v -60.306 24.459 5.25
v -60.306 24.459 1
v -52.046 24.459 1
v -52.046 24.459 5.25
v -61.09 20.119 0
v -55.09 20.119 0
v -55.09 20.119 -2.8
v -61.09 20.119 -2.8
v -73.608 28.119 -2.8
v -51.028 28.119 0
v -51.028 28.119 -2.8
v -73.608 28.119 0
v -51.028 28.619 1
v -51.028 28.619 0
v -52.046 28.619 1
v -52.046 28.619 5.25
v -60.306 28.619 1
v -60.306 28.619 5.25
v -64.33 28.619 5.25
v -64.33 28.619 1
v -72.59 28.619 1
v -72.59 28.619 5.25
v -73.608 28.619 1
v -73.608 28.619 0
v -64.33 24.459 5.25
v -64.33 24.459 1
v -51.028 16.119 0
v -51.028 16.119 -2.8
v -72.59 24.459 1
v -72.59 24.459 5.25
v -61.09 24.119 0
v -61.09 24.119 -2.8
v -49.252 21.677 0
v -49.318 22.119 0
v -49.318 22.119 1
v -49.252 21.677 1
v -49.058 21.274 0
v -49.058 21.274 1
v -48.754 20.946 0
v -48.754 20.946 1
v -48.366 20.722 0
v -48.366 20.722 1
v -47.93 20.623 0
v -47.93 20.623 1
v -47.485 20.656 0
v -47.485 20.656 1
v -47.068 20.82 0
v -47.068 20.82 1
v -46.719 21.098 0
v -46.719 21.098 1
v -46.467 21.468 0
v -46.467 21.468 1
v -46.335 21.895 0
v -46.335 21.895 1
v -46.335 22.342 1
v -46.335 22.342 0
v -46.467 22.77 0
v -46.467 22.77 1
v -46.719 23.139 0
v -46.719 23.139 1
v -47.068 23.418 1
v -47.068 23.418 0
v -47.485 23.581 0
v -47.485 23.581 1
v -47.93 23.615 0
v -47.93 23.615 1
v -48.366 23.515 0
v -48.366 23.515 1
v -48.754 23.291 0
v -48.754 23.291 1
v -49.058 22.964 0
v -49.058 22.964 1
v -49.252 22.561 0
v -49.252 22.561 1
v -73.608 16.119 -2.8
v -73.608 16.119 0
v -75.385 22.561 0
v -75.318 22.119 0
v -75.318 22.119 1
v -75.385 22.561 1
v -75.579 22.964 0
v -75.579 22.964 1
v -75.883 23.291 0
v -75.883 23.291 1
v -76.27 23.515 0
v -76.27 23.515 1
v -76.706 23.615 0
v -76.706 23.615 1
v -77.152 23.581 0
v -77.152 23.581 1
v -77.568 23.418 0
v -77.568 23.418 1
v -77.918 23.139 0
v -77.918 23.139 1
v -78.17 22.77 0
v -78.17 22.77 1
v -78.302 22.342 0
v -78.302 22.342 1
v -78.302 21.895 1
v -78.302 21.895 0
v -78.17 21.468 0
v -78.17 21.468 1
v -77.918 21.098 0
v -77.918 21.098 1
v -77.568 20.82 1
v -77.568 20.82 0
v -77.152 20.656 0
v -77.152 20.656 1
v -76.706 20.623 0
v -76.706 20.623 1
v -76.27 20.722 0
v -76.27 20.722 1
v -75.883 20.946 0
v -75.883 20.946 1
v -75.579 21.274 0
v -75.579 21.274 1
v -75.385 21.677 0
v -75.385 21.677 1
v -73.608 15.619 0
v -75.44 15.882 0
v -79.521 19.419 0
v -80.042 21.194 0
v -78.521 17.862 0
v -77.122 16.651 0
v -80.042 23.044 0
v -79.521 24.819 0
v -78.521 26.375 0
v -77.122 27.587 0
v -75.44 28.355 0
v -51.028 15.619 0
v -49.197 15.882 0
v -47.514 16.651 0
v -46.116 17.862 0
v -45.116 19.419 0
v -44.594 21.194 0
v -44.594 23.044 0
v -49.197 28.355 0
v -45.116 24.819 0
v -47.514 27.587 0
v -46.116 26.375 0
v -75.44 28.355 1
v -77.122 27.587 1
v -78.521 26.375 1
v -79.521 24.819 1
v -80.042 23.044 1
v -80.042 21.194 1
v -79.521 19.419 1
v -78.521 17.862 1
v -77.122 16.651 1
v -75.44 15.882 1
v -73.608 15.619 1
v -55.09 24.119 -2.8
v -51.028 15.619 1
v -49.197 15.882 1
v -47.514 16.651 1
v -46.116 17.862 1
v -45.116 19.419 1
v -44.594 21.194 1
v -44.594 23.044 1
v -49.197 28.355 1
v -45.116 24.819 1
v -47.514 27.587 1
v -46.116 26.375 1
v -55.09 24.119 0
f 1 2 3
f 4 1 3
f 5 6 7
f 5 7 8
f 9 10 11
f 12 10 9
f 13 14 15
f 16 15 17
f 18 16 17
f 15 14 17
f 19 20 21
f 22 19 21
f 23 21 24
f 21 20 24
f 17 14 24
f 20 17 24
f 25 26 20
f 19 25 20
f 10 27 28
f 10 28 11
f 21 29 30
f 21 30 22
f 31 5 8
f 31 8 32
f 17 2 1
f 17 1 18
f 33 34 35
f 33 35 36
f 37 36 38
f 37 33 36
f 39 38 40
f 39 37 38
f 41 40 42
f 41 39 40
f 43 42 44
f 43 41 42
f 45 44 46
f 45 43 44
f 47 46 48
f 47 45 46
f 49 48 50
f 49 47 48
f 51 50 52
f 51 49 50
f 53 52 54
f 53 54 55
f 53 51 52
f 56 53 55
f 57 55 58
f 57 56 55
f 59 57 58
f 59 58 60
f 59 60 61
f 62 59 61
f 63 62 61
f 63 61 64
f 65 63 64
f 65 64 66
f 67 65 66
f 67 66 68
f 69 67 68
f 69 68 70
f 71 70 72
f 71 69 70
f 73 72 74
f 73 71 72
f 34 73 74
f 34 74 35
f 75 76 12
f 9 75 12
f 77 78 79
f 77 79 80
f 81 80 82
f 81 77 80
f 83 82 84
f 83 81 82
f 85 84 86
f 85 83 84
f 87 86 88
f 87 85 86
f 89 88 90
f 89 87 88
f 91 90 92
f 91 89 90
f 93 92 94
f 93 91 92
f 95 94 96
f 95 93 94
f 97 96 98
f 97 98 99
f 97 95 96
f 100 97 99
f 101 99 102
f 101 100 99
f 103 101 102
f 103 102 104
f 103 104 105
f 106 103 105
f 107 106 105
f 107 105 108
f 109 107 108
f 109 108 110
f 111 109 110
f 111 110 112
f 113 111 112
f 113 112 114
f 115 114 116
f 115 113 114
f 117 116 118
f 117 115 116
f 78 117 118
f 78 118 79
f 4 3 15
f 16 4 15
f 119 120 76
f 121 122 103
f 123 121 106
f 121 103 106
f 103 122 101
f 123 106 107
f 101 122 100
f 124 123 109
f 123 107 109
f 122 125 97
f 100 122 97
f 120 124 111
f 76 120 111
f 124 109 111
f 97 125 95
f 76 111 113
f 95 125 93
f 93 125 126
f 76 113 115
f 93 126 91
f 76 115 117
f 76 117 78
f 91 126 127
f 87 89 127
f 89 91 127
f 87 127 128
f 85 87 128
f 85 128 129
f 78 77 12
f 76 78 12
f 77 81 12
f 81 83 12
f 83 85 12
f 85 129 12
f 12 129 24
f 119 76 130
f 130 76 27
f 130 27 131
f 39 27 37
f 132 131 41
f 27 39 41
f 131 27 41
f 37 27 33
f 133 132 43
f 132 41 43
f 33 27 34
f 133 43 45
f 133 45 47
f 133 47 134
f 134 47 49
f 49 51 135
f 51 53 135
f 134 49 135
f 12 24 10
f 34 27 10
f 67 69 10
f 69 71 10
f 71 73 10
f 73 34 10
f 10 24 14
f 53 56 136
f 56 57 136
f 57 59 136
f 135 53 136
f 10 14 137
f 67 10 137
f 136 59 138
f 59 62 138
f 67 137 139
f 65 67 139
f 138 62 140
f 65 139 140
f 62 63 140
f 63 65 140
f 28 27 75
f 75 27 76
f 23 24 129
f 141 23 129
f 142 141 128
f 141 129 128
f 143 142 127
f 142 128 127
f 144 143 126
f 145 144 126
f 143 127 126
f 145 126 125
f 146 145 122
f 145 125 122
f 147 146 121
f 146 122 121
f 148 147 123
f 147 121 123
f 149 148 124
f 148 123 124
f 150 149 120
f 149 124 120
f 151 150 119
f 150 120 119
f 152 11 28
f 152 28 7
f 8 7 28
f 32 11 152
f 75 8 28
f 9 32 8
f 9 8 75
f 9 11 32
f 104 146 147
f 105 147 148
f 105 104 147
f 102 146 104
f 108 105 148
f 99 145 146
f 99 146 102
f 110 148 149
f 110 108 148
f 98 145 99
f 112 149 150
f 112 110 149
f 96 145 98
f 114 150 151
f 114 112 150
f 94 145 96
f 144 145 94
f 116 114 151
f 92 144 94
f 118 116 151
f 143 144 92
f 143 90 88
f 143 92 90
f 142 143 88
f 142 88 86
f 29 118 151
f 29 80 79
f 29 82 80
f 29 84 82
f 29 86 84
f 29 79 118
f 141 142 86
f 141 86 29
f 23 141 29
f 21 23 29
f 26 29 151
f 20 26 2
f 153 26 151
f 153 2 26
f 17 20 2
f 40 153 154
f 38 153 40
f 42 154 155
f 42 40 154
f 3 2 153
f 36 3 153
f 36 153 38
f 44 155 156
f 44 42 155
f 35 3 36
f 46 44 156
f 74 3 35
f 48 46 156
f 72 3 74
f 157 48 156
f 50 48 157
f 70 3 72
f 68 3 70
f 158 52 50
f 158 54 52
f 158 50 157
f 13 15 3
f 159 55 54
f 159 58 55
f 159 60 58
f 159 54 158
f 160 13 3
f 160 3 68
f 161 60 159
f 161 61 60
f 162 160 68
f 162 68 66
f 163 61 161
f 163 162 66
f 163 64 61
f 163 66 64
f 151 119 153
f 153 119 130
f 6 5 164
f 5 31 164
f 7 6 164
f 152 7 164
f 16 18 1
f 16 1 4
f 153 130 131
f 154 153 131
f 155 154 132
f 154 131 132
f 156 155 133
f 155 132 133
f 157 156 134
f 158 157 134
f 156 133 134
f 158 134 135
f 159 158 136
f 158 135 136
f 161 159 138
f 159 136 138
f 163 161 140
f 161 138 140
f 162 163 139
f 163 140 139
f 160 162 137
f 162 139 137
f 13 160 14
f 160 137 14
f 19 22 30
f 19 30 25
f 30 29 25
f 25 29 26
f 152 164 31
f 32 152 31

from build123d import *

# Parameters (mm, degrees)
SKETCH1_R           = 1.5
BOSS_EXTRUDE1_DEPTH = 1
SKETCH3_W           = 22.58
SKETCH3_H           = 12
SKETCH3_W_2         = 6
SKETCH3_H_2         = 4
BOSS_EXTRUDE2_DEPTH = 2.8
SKETCH4_W           = 8.26
SKETCH4_H           = 4.16
BOSS_EXTRUDE3_DEPTH = 4.25


with BuildPart() as part:
    # Sketch1 → Boss-Extrude1 (new body)
    with BuildSketch(Plane.XY):
        with BuildLine():
            Line((-73.608329156, 15.618710575), (-51.028329156, 15.618710575))
            ThreePointArc((-51.028329156, 15.618710575), (-44.528329156, 22.118710575), (-51.028329156, 28.618710575))
            Line((-51.028329156, 28.618710575), (-73.608329156, 28.618710575))
            ThreePointArc((-73.608329156, 28.618710575), (-80.108329156, 22.118710575), (-73.608329156, 15.618710575))
        make_face()
        with Locations((-76.818329156, 22.118710575)):
            Circle(SKETCH1_R, mode=Mode.SUBTRACT)
        with Locations(Location((-47.818329156, 22.118710575, 0), (0, 0, 180))):
            Circle(SKETCH1_R, mode=Mode.SUBTRACT)
    extrude(amount=BOSS_EXTRUDE1_DEPTH)

    # Sketch3 → Boss-Extrude2 (add)
    with BuildSketch(Plane(origin=(0, 0, 0), x_dir=(-1, 0, 0), z_dir=(0, 0, -1))):
        with Locations((62.318329156, 22.118710575)):
            Rectangle(SKETCH3_W, SKETCH3_H)
        with Locations((58.090026235, 22.118710575)):
            Rectangle(SKETCH3_W_2, SKETCH3_H_2, mode=Mode.SUBTRACT)
    extrude(amount=BOSS_EXTRUDE2_DEPTH)

    # Sketch4 → Boss-Extrude3 (add)
    with BuildSketch(Plane.XY.offset(1)):
        with Locations((-68.460165602, 26.538710575)):
            Rectangle(SKETCH4_W, SKETCH4_H)
        with Locations((-56.176492709, 26.538710575)):
            Rectangle(SKETCH4_W, SKETCH4_H)
    extrude(amount=BOSS_EXTRUDE3_DEPTH)


solid = part.part
